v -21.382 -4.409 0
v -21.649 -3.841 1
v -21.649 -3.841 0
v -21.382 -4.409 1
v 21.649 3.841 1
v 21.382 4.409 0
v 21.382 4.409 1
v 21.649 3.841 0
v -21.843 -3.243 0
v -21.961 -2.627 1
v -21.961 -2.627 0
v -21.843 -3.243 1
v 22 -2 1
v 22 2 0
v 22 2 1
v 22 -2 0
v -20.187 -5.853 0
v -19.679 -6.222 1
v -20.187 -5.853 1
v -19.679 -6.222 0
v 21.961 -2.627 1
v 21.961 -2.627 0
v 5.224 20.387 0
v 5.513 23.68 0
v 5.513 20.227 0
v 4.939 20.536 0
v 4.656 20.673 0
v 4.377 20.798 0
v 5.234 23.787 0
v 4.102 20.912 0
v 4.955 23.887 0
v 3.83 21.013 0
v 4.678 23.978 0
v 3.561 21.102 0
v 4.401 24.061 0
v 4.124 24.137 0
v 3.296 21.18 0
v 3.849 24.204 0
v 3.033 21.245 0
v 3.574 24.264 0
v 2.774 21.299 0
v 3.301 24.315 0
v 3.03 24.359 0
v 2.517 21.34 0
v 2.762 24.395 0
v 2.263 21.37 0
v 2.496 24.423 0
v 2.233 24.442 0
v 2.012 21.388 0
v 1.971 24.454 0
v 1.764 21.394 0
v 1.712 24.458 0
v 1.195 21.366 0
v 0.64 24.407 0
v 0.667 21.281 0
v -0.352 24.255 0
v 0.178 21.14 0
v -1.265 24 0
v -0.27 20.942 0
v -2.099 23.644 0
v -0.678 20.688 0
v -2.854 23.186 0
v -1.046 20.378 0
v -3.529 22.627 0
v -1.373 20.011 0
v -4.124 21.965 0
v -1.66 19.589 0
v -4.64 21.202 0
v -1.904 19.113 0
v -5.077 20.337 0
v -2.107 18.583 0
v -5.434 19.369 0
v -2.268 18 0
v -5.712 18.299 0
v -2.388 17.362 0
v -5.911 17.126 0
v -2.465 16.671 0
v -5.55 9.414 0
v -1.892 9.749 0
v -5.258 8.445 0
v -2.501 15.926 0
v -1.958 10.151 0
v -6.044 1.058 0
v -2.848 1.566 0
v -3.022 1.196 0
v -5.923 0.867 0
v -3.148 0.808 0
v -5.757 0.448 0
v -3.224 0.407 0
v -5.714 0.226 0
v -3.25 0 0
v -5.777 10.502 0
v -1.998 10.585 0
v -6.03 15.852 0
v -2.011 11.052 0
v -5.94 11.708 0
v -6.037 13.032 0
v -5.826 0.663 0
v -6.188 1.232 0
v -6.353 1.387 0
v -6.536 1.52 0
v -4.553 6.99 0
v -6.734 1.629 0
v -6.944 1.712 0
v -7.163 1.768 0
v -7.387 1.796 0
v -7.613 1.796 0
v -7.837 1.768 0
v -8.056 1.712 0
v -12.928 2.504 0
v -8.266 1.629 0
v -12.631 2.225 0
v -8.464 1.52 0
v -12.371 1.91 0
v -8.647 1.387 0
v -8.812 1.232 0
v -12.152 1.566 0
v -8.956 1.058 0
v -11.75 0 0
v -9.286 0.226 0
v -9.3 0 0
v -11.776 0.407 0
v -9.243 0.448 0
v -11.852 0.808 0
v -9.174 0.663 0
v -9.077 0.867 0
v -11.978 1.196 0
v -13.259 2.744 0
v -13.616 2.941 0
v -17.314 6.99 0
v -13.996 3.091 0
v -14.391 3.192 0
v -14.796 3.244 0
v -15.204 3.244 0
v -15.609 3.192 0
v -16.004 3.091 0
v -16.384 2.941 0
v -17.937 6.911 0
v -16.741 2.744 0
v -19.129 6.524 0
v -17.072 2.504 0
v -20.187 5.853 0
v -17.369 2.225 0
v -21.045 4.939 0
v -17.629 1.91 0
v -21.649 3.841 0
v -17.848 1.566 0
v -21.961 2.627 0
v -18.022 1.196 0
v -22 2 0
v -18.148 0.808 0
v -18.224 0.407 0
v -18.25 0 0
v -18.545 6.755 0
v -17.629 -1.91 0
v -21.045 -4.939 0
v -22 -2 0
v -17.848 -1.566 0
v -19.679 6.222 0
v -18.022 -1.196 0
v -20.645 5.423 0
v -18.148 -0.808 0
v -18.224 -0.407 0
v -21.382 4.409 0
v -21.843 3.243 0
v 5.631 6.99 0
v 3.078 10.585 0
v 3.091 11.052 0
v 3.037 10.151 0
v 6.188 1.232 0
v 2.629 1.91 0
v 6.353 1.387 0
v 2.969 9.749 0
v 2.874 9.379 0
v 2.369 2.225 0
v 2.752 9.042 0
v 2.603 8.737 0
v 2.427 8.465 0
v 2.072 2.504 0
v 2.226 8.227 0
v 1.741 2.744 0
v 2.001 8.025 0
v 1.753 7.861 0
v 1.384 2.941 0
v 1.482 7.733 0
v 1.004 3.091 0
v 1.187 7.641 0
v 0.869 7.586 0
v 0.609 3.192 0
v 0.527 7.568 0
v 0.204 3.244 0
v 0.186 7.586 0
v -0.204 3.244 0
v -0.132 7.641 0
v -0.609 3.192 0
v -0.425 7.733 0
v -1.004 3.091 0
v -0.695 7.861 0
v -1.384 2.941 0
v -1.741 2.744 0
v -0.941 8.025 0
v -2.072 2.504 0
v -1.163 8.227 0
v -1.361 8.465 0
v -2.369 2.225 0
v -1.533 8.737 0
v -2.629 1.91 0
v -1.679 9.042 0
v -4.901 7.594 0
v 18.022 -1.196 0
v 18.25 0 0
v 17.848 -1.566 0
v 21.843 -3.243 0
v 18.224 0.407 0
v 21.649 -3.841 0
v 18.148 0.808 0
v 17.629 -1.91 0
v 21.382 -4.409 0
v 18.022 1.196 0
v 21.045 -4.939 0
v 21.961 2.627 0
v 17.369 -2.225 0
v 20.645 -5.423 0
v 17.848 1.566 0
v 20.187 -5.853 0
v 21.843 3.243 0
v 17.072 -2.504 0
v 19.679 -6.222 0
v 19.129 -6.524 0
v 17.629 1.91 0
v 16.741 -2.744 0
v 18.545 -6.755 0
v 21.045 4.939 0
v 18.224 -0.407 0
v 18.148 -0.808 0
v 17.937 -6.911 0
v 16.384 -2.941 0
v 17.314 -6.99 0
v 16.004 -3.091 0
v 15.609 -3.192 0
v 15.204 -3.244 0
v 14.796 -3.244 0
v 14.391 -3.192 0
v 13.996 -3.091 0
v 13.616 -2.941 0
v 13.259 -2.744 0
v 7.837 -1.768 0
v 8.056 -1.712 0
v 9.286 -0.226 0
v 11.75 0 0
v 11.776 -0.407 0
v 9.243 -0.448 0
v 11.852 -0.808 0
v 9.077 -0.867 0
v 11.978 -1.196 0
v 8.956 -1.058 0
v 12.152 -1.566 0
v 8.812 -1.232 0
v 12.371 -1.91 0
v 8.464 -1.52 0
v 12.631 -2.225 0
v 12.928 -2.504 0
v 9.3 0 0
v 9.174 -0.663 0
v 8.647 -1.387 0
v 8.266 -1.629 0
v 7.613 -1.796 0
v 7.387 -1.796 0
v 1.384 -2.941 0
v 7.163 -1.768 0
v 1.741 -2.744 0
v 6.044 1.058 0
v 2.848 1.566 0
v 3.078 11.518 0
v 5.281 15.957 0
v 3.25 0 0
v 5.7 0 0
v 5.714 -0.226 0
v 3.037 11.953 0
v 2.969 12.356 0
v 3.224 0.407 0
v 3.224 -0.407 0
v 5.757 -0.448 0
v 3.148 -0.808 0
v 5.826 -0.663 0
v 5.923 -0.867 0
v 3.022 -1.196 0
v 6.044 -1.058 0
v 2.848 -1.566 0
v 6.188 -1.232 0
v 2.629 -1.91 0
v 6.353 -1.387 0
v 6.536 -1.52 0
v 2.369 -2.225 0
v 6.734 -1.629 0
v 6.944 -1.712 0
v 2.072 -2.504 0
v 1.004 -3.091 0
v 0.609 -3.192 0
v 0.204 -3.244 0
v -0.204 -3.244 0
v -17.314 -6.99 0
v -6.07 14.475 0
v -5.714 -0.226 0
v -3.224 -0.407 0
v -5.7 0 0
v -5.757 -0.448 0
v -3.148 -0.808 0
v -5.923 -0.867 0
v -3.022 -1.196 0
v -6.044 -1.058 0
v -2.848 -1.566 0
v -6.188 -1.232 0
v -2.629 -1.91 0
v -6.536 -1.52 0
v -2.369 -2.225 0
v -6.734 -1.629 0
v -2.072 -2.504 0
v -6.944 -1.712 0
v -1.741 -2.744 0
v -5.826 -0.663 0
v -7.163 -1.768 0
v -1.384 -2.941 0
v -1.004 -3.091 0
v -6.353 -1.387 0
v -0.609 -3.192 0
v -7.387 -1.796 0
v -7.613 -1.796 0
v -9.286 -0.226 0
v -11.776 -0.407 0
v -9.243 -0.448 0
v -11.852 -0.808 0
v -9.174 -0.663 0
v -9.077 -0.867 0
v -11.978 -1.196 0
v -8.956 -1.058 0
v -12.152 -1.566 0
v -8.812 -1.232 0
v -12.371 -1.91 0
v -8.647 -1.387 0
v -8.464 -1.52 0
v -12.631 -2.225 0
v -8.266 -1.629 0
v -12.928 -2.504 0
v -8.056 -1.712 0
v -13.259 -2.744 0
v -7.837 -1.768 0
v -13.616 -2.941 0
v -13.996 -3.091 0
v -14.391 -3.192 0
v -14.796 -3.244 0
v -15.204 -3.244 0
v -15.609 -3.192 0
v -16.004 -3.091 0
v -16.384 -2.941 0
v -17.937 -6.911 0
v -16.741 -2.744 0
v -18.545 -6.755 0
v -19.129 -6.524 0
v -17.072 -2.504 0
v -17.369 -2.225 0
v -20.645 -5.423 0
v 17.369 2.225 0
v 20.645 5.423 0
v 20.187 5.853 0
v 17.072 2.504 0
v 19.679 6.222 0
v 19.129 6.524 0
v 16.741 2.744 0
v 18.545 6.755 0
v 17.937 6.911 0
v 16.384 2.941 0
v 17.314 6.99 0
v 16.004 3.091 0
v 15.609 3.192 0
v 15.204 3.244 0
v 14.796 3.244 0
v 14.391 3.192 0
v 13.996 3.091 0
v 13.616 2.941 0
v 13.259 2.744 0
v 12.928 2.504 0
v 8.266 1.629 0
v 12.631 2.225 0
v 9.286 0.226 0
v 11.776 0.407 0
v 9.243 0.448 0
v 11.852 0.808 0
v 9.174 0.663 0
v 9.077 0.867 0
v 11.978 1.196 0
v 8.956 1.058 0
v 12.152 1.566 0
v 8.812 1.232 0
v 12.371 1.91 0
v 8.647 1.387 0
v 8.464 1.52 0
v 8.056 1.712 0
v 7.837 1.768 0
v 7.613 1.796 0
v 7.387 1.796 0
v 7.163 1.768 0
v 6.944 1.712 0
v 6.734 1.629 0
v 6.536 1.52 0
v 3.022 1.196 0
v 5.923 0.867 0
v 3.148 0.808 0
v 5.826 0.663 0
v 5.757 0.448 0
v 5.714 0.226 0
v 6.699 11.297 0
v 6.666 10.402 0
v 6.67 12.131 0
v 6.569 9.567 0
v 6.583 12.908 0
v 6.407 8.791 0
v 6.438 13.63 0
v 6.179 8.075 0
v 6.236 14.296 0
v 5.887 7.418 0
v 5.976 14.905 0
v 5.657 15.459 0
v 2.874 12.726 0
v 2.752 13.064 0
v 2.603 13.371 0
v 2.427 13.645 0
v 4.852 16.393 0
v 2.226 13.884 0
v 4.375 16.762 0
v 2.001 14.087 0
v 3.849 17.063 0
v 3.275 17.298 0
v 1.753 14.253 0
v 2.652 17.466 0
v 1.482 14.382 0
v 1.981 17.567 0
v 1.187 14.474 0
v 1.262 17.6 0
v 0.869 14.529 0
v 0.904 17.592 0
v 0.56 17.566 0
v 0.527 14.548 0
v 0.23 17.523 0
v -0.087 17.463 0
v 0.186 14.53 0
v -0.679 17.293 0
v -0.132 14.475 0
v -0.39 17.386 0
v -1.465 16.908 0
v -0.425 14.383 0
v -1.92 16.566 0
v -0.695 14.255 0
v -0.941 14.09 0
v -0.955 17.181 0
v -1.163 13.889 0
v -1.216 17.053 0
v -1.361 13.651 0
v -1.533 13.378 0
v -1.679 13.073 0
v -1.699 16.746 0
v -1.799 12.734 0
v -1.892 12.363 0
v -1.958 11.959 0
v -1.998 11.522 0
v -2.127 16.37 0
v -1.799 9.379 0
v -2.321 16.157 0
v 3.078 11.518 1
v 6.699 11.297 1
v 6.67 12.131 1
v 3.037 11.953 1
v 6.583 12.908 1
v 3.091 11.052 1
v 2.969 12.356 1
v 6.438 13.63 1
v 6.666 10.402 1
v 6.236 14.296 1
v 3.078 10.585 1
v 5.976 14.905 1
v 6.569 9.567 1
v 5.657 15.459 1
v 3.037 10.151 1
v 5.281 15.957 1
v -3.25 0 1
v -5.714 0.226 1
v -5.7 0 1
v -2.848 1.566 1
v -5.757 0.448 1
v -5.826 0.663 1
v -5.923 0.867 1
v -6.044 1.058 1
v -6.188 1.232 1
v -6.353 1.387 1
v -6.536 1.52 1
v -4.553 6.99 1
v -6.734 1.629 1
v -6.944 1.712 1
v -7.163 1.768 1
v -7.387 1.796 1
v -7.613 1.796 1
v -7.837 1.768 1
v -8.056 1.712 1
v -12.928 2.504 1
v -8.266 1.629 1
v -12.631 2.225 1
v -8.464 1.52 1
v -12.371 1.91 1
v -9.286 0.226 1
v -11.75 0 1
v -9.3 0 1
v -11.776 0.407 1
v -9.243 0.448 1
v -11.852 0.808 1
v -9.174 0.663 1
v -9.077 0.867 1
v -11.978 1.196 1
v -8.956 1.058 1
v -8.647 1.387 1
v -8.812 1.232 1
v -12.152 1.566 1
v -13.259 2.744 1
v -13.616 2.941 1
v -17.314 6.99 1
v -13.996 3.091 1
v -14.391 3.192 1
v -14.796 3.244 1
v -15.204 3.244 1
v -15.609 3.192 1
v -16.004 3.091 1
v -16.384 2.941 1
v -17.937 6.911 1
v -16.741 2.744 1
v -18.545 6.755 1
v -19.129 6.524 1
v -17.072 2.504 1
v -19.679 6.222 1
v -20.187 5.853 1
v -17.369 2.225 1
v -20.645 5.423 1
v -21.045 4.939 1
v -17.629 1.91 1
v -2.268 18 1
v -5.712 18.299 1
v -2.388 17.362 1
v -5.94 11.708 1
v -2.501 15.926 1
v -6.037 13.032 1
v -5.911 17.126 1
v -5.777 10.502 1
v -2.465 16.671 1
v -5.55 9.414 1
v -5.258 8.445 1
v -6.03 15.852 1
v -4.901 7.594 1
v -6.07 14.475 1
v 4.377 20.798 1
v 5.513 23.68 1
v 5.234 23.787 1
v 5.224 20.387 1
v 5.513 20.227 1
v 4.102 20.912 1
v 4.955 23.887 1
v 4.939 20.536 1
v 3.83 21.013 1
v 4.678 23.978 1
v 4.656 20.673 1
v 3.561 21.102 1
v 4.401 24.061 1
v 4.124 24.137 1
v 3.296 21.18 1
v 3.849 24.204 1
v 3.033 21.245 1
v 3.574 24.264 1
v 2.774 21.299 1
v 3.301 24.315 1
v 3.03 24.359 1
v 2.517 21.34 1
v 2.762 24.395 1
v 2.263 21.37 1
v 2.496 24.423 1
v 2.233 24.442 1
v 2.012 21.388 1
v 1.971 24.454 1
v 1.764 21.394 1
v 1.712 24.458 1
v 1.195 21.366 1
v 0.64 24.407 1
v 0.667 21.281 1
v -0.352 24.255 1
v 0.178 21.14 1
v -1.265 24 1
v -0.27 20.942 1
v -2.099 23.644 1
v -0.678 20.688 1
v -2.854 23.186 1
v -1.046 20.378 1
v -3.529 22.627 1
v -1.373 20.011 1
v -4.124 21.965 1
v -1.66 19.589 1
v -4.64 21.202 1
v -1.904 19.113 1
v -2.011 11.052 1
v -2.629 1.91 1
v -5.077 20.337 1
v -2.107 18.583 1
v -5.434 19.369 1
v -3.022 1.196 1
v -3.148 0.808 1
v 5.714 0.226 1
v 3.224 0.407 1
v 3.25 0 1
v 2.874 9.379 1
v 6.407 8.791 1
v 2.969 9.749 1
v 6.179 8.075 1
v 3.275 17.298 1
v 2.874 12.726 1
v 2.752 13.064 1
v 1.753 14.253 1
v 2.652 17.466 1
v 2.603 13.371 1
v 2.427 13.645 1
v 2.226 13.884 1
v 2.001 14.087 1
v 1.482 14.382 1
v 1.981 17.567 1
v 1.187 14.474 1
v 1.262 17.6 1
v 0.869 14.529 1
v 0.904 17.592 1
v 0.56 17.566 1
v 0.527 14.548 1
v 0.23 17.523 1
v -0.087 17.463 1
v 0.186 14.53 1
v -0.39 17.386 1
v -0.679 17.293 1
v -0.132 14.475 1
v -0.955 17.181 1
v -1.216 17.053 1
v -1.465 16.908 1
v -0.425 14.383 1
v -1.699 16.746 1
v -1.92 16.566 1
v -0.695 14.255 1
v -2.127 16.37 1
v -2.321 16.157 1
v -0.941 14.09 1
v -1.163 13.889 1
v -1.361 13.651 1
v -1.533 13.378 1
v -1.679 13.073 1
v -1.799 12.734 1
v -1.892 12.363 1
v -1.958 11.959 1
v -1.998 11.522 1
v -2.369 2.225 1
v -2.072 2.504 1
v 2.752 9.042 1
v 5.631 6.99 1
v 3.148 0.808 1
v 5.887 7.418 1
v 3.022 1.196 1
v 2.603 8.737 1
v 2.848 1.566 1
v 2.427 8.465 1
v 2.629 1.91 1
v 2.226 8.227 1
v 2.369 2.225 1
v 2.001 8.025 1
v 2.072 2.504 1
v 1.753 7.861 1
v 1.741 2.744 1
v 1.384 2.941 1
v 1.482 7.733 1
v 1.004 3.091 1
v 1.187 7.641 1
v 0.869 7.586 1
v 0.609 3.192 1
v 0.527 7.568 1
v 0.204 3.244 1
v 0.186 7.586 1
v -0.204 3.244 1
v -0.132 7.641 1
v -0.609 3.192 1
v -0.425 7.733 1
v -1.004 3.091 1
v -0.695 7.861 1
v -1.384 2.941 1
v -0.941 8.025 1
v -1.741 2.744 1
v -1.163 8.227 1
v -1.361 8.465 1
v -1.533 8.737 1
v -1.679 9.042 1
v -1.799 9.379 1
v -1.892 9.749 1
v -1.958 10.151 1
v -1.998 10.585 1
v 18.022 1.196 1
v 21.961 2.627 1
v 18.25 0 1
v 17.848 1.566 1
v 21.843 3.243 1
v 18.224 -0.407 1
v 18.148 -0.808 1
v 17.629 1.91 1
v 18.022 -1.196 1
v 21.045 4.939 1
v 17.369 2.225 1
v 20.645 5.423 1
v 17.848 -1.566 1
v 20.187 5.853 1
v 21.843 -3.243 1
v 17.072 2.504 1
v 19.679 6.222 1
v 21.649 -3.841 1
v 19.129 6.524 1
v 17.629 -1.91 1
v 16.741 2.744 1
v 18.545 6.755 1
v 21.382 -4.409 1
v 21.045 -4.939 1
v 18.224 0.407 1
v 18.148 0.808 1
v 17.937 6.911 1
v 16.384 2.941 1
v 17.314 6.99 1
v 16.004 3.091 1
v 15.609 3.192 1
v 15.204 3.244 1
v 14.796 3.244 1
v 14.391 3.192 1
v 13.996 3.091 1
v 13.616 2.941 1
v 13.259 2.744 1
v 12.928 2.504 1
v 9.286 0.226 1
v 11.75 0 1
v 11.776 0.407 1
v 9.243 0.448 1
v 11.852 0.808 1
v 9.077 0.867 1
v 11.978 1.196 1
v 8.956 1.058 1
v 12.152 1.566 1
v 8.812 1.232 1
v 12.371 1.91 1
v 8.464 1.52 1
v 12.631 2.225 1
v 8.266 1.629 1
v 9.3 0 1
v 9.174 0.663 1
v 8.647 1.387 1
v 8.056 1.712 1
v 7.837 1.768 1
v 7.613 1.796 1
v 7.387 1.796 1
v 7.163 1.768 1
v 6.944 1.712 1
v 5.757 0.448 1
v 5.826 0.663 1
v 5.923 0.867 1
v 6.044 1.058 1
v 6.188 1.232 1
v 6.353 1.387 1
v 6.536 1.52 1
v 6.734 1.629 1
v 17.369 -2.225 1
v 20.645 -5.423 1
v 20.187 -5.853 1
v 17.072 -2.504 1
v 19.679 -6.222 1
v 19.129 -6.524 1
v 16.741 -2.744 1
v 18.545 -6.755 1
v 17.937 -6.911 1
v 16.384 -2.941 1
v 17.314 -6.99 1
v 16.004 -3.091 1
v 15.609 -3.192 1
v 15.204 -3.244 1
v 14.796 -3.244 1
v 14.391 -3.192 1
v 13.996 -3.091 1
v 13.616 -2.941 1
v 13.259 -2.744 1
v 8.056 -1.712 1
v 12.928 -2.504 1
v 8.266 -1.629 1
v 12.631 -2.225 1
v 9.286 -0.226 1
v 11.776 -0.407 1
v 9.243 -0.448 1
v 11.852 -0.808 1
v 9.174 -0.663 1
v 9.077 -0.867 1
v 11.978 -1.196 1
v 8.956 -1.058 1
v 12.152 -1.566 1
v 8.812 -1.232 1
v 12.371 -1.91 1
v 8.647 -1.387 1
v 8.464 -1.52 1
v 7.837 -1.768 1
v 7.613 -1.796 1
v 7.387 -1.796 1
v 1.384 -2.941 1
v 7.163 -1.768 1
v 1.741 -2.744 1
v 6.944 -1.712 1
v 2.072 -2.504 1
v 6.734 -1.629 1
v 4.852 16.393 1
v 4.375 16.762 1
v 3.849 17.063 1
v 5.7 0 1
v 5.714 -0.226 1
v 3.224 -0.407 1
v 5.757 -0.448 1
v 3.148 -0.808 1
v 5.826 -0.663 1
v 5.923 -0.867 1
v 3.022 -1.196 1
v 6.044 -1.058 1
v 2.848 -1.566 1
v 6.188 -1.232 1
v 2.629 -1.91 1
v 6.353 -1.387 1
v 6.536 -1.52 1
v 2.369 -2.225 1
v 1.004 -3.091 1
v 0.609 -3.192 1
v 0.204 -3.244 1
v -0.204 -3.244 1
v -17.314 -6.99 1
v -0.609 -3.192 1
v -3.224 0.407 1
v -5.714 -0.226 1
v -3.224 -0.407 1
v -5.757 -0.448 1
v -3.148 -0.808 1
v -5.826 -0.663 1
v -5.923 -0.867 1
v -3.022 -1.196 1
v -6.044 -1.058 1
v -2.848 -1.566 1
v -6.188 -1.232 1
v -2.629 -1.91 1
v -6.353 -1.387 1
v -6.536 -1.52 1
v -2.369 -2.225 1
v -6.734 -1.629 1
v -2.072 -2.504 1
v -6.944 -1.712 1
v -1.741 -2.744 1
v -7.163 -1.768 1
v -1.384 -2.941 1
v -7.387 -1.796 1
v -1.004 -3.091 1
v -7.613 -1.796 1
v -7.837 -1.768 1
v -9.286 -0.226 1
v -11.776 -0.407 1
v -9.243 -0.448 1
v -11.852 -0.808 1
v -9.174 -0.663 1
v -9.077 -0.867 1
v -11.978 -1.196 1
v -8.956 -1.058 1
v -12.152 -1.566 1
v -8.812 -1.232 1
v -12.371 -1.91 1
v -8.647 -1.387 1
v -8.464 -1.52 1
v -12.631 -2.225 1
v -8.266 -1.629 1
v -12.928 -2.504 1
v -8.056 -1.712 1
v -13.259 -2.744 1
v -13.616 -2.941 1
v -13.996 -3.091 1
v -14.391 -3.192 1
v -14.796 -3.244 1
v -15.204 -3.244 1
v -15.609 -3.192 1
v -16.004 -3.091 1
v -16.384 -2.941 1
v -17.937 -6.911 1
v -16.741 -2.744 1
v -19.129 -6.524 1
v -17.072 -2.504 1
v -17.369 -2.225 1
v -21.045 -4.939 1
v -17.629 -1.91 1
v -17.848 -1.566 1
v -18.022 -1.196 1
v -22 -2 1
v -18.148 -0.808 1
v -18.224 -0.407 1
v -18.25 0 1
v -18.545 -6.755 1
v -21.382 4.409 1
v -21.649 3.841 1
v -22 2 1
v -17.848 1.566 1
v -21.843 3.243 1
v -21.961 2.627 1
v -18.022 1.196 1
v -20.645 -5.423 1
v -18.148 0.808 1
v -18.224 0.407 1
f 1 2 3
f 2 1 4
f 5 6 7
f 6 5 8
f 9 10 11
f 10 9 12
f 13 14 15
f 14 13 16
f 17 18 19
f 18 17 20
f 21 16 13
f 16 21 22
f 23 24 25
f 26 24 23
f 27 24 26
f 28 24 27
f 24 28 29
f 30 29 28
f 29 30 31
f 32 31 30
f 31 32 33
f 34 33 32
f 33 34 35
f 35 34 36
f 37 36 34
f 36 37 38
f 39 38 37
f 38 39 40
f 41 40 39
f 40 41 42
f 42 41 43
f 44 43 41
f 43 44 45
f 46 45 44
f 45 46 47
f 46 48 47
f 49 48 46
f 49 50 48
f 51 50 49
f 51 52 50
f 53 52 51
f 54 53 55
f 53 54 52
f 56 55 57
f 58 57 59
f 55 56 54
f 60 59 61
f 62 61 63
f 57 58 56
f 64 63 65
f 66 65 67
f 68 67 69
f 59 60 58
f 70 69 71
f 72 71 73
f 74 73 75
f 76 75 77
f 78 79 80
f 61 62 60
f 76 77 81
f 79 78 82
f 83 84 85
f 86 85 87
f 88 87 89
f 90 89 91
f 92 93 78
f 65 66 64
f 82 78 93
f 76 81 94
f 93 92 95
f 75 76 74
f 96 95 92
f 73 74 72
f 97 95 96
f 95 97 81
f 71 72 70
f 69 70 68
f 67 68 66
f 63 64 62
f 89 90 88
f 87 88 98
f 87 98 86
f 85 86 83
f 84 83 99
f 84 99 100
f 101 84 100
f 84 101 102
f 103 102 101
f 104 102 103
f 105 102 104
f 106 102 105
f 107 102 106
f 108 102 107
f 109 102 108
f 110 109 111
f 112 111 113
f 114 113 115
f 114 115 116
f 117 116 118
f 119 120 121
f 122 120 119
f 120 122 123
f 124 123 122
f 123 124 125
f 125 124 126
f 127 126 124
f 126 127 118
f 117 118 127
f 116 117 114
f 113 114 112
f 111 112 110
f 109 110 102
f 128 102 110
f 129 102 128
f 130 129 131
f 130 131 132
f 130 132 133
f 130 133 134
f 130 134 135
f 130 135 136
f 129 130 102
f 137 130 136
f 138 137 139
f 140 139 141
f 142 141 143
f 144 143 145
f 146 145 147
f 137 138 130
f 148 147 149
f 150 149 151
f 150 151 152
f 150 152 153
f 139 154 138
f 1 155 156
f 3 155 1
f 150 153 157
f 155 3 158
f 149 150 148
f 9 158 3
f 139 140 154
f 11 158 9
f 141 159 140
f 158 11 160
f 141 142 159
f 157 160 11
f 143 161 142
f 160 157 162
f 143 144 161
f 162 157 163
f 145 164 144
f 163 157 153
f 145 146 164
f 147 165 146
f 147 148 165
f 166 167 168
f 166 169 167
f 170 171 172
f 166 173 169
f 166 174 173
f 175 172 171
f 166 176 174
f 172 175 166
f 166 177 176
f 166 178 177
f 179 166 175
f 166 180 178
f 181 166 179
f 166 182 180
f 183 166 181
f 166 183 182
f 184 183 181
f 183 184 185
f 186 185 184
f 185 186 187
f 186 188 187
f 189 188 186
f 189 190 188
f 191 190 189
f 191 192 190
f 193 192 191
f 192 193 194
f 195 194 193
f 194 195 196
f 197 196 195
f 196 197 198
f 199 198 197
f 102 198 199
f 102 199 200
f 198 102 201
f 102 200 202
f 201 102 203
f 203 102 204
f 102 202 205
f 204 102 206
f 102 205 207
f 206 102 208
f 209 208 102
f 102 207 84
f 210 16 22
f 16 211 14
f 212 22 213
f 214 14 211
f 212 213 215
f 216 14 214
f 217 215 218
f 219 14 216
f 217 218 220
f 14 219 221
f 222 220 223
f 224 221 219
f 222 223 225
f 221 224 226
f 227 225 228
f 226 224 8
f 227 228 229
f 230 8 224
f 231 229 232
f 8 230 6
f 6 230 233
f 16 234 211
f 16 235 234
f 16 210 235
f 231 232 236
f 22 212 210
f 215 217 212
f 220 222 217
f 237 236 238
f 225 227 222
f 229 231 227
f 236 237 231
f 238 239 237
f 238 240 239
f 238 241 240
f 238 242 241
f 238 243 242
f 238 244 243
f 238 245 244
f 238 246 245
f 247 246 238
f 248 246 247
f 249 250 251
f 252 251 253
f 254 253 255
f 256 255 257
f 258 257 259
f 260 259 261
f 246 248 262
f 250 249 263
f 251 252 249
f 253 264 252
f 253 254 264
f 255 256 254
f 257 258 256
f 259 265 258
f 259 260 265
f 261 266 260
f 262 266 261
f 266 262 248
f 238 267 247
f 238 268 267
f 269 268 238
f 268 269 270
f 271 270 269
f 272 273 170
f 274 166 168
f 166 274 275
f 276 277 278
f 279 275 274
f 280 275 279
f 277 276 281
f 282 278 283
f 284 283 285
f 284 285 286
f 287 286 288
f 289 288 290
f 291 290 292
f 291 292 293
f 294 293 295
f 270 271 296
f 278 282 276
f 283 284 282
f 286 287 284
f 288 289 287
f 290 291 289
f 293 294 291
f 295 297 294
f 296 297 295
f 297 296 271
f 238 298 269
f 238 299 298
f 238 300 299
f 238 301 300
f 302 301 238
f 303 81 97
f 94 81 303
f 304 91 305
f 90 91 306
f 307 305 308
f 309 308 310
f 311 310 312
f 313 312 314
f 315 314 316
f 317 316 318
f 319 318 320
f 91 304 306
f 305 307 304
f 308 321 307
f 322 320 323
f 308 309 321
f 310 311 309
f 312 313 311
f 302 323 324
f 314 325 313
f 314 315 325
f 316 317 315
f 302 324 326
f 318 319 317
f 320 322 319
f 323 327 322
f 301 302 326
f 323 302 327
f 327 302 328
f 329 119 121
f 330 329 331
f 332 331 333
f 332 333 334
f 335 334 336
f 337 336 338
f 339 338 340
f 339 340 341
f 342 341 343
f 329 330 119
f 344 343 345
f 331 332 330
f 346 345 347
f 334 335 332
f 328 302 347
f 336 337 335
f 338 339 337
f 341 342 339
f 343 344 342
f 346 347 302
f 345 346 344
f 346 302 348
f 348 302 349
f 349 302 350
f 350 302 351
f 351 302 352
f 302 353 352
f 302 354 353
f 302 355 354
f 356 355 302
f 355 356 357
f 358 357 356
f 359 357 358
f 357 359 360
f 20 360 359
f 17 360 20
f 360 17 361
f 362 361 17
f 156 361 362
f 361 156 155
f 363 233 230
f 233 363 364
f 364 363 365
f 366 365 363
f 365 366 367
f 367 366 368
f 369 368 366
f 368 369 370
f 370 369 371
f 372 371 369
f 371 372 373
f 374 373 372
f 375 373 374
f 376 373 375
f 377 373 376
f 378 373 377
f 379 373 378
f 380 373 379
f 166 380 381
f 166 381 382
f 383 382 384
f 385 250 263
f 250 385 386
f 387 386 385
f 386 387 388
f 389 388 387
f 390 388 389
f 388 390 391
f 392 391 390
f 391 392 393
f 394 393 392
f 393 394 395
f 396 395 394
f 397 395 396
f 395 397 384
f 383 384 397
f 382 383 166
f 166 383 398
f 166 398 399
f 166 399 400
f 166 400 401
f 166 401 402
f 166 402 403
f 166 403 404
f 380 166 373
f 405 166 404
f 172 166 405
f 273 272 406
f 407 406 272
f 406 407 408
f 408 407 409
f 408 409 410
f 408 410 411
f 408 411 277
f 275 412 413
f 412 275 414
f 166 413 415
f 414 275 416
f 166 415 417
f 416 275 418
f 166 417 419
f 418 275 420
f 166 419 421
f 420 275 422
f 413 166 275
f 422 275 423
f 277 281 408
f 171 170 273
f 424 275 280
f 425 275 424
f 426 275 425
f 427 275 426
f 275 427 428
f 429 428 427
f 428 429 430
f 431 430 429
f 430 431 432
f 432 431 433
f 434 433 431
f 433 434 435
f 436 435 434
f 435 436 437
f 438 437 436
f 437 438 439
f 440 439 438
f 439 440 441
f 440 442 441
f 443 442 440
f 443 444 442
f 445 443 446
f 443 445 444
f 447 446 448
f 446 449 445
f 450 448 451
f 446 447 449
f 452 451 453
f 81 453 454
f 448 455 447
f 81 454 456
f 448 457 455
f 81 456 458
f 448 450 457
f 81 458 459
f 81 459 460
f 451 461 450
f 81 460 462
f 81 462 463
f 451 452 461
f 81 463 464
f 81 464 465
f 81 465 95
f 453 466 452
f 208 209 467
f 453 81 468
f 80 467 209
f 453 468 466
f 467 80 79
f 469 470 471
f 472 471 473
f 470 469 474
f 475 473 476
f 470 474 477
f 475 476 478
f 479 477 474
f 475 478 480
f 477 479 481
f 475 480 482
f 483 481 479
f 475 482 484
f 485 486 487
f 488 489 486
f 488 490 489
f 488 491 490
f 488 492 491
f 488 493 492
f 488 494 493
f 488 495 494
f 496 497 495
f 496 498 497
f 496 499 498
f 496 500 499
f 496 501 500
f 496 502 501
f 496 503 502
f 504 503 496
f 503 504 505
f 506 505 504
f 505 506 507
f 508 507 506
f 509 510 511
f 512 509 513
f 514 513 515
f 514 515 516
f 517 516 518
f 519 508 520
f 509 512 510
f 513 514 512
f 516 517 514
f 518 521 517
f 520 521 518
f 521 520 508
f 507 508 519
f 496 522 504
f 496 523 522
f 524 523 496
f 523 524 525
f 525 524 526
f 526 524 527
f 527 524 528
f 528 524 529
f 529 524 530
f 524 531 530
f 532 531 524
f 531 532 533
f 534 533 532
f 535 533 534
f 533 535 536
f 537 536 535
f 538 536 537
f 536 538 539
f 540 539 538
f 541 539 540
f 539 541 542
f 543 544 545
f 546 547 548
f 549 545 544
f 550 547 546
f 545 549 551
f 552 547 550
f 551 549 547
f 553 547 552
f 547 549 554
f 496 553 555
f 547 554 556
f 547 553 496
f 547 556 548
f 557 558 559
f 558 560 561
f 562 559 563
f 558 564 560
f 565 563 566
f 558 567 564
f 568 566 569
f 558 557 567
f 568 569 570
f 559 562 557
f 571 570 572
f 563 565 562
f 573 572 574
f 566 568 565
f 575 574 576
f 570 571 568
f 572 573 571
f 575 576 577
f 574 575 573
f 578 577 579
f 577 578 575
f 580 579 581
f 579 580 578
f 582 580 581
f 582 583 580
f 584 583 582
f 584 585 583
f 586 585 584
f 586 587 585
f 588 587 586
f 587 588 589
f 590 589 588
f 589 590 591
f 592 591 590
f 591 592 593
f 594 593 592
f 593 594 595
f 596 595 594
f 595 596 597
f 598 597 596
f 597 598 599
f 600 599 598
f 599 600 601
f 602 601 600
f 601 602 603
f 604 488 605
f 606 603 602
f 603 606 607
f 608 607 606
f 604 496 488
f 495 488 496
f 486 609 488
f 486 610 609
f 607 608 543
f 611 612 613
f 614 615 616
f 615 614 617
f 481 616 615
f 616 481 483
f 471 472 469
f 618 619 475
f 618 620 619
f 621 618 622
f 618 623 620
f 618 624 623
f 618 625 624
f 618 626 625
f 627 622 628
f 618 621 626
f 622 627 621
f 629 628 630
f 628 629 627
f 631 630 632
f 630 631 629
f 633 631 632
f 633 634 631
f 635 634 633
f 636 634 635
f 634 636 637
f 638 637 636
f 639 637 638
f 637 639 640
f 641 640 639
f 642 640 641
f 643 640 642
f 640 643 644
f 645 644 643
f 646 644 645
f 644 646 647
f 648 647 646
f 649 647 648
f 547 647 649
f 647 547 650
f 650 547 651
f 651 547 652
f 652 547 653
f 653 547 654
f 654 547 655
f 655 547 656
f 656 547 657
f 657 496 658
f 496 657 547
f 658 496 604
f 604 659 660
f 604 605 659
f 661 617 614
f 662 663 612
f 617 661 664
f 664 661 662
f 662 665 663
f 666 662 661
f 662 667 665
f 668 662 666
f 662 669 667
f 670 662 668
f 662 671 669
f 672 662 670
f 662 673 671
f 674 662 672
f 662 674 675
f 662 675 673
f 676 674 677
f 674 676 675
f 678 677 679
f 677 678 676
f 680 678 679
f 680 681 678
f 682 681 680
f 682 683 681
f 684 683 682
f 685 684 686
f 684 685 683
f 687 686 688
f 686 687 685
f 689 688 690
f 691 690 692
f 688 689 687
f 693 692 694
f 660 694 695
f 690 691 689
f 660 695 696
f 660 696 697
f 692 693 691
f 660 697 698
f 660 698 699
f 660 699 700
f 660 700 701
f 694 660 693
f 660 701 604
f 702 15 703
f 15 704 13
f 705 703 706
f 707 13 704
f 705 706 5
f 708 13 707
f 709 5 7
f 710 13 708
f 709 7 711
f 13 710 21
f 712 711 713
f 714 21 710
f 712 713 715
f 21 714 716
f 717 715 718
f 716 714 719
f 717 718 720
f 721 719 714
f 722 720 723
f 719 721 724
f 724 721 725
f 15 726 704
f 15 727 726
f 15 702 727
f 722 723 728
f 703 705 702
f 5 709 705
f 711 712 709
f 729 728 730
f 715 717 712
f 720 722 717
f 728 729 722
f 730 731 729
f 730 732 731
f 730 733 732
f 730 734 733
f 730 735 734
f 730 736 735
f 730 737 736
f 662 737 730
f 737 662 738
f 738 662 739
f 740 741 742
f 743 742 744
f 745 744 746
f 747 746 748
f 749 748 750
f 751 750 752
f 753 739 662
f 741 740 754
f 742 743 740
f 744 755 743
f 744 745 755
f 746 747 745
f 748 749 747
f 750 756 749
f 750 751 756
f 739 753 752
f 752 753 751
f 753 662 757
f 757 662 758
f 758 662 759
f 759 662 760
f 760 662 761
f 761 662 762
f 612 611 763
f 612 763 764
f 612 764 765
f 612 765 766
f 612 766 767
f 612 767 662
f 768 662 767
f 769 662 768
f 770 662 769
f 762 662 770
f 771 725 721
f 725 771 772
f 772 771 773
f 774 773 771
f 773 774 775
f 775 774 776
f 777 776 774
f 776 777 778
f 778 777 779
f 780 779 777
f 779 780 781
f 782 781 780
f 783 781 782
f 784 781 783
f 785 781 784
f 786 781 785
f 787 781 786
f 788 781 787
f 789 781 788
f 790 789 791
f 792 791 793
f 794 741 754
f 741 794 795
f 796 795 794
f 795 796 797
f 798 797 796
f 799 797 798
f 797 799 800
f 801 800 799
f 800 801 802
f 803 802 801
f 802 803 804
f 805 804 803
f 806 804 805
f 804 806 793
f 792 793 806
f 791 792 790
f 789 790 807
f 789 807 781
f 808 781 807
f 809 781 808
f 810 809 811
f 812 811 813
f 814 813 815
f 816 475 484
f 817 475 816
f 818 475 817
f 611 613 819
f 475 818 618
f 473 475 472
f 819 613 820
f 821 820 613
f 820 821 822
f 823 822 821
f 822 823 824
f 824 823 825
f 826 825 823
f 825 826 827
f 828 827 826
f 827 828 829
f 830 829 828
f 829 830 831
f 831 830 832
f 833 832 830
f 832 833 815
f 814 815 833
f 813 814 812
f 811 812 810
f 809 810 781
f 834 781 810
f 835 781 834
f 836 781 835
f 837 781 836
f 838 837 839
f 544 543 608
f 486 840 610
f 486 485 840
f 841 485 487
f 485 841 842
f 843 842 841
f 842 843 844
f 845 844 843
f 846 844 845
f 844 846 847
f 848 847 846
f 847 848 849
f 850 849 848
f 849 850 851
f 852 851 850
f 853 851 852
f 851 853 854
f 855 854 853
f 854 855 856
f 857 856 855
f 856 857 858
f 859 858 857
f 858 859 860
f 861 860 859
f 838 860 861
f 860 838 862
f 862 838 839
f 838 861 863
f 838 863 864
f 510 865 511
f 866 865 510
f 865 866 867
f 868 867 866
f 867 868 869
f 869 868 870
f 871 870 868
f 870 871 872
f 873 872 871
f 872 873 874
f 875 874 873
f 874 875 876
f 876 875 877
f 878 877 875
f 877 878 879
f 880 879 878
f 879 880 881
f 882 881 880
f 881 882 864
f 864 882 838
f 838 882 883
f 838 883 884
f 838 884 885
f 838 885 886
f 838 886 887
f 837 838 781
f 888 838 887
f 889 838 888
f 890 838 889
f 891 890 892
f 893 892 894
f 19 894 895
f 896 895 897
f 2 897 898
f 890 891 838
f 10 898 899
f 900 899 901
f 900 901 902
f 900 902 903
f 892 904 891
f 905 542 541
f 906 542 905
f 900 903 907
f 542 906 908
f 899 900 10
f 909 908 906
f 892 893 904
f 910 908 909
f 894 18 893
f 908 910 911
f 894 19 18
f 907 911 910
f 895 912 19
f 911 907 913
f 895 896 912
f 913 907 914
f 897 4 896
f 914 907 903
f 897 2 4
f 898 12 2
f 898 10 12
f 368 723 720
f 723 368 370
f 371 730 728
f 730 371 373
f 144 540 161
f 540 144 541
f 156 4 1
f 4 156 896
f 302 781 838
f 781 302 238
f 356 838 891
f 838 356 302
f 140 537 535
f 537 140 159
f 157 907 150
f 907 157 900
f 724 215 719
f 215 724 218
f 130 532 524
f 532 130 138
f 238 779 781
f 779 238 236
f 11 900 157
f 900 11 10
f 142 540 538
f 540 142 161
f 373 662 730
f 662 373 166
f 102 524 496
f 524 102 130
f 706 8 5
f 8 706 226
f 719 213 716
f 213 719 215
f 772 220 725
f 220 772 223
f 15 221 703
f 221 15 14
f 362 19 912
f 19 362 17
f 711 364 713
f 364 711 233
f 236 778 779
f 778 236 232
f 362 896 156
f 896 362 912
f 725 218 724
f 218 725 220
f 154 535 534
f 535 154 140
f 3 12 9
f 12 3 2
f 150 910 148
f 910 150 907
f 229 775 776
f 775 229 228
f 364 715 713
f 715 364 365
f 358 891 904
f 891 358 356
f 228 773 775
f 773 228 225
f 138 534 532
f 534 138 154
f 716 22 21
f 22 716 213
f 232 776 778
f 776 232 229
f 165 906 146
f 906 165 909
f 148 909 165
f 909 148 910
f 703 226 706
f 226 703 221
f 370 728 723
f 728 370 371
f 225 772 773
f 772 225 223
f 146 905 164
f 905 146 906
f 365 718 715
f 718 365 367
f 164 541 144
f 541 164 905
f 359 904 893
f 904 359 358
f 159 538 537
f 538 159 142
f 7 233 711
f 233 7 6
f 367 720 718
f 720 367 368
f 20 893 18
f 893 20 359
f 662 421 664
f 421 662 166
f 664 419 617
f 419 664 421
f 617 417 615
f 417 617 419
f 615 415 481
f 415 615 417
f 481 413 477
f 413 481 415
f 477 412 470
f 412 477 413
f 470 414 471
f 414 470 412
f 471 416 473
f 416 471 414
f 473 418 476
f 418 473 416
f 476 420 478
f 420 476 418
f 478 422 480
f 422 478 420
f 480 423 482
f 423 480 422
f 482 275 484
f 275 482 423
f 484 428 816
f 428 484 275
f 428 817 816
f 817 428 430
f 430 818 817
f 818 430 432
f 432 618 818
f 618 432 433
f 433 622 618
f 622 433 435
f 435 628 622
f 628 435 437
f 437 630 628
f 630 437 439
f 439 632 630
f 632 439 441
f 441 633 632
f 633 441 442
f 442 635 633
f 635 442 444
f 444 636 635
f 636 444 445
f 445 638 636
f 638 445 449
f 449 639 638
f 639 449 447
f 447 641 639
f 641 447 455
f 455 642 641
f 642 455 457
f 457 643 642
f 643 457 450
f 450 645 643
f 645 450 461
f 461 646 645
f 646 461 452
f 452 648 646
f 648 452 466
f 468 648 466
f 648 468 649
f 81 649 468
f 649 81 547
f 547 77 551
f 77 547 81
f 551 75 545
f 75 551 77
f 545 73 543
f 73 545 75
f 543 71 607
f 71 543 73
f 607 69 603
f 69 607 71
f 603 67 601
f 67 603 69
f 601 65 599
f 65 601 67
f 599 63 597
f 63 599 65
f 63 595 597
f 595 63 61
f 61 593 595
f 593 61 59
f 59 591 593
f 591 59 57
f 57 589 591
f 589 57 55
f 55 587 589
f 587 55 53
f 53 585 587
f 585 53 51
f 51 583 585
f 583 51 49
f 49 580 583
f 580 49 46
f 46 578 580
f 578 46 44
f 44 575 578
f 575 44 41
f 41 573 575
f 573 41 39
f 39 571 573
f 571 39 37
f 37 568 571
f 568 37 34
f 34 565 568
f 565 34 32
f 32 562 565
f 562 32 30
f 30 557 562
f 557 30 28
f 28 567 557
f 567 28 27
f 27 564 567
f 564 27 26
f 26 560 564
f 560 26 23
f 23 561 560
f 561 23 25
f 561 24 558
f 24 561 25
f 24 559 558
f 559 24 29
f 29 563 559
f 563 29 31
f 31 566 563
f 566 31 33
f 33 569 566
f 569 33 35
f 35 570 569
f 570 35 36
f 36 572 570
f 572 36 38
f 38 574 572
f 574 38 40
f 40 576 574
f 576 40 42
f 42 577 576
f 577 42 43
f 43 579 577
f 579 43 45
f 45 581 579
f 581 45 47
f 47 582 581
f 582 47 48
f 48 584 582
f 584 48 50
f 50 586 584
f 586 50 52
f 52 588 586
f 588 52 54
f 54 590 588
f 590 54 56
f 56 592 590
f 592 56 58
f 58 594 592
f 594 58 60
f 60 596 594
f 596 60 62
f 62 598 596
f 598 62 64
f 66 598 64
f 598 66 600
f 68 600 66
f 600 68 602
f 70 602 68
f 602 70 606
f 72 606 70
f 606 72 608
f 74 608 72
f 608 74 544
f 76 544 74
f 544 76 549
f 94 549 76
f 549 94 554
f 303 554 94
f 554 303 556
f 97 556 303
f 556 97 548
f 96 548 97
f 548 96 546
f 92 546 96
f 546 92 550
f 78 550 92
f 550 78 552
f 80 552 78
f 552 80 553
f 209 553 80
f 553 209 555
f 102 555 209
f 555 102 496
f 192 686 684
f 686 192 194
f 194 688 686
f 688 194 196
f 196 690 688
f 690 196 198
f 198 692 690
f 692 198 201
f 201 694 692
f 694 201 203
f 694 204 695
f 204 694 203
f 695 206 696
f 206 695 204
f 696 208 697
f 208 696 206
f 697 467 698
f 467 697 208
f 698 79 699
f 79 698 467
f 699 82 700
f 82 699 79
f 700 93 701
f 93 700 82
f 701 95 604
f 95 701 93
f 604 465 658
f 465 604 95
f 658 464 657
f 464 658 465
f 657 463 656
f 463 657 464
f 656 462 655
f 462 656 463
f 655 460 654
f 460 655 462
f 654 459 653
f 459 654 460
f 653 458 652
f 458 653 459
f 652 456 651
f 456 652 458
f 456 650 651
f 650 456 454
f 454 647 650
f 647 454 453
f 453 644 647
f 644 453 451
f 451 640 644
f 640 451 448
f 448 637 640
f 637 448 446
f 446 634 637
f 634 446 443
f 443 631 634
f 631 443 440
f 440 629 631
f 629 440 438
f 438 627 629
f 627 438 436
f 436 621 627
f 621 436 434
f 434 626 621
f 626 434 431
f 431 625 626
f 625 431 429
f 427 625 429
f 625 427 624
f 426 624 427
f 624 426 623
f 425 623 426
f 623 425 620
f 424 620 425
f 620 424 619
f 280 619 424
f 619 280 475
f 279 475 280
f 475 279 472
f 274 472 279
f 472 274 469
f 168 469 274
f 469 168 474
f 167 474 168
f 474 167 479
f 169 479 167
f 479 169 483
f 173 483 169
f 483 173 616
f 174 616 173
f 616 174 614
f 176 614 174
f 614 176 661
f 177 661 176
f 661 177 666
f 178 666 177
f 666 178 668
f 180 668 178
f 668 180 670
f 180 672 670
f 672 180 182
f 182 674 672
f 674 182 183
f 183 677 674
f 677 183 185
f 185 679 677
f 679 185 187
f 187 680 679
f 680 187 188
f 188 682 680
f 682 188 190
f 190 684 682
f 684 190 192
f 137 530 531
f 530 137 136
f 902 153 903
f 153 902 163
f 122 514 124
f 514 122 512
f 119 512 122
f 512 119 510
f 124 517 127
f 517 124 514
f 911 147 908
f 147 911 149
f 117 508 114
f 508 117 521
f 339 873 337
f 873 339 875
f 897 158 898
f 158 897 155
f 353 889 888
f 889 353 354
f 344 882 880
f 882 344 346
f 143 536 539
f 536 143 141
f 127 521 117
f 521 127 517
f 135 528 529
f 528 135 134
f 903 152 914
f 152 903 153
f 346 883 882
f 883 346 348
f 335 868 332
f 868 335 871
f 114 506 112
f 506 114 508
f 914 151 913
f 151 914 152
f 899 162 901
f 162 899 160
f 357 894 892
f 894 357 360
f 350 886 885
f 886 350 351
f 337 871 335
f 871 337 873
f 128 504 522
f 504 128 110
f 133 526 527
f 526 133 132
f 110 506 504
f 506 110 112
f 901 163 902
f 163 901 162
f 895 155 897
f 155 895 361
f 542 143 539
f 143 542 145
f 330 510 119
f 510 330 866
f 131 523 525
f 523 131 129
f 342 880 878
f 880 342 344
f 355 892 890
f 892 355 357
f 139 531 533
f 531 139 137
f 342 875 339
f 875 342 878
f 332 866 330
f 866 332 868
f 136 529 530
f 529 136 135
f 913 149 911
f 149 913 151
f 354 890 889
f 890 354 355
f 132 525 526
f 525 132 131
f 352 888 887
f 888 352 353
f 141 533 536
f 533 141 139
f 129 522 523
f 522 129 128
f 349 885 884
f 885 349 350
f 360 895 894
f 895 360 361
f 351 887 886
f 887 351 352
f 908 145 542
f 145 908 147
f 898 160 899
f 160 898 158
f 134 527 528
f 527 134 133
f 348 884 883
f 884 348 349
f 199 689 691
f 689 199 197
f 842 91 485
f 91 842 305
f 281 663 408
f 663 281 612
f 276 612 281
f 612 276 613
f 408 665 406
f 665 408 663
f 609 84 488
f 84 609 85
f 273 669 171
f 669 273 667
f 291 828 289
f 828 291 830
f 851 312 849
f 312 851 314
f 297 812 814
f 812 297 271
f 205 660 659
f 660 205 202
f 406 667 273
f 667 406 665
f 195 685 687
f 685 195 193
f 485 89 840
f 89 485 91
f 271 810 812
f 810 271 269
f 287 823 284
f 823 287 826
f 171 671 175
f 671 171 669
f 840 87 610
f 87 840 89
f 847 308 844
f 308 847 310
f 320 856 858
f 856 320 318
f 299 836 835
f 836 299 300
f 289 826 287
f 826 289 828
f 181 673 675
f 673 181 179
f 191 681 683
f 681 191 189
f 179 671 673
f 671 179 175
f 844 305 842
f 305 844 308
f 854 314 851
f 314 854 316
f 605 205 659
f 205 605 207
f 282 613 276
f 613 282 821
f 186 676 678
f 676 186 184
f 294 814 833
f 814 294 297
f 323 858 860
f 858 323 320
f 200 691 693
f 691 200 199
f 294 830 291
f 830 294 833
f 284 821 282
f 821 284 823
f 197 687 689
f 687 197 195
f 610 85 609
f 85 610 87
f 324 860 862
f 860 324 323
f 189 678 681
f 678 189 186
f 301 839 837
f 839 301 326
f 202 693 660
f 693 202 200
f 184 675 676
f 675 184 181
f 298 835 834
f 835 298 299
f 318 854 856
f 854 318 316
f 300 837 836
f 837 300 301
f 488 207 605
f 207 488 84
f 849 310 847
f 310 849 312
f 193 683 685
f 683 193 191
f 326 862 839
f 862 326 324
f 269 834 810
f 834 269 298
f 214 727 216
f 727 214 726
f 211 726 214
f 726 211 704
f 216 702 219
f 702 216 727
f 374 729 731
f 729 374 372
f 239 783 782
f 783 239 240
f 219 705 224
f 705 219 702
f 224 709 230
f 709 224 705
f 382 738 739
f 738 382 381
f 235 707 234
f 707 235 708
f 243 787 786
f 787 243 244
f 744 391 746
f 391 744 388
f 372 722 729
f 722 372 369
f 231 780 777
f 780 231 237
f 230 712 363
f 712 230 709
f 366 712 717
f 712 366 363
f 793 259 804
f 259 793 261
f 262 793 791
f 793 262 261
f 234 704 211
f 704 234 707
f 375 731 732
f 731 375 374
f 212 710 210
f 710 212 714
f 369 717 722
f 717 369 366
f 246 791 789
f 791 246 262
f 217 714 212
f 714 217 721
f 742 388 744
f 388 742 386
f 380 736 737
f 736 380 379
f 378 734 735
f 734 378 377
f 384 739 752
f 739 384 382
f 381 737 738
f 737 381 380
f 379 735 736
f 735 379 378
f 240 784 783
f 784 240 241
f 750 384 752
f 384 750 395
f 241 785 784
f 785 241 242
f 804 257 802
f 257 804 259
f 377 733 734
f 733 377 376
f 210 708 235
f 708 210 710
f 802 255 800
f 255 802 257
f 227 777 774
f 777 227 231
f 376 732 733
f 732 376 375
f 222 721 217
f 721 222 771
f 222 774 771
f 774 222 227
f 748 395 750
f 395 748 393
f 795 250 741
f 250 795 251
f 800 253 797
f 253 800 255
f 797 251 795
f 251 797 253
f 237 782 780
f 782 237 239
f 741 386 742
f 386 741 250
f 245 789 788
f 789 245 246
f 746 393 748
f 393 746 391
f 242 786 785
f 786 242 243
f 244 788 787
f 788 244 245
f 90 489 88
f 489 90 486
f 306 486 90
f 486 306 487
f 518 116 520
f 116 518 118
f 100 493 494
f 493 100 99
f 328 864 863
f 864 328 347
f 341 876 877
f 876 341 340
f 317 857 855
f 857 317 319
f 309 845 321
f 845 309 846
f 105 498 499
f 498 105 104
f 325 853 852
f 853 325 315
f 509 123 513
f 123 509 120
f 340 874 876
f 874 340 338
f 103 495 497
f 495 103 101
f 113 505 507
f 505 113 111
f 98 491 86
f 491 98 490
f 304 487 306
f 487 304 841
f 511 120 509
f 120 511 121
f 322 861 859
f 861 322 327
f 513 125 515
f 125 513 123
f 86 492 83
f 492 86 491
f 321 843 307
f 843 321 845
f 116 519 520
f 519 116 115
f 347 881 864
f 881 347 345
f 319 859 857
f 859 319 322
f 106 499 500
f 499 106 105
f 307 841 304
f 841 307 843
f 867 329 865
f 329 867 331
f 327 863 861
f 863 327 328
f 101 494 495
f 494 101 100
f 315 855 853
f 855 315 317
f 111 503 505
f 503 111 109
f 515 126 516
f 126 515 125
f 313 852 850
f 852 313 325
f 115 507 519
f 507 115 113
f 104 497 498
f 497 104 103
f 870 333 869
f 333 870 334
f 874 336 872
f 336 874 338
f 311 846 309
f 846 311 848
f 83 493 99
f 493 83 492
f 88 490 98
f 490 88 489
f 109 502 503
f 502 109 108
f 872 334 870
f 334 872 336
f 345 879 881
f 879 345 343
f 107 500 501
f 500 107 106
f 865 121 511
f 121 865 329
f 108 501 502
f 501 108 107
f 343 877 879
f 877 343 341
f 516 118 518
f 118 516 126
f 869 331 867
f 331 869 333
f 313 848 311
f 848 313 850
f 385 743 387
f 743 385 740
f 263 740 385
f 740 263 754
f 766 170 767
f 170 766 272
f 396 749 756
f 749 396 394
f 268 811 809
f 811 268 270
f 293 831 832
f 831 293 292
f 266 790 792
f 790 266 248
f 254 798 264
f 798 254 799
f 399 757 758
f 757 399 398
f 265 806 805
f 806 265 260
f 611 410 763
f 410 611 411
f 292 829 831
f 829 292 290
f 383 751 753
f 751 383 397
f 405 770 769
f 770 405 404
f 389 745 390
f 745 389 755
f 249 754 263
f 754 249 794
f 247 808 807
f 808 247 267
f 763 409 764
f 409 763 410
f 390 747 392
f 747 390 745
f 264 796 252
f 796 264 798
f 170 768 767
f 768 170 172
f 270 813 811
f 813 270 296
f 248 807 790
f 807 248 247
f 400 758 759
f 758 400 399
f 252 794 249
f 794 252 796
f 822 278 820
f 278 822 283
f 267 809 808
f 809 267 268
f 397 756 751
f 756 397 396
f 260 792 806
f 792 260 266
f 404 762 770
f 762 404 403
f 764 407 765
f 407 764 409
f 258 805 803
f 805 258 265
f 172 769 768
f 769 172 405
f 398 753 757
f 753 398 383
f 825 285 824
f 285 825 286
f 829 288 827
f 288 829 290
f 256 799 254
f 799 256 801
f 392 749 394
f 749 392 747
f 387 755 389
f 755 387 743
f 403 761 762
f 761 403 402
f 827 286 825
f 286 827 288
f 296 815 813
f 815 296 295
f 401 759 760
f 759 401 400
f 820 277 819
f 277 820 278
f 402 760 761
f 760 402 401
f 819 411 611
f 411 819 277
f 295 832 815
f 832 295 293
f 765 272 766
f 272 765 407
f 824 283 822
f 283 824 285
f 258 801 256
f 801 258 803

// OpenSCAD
$fn = 50;


difference() {
	union() {
		hull() {
			translate(v = [-17.0000000000, 2.0000000000, 0]) {
				cylinder(h = 1, r = 5);
			}
			translate(v = [17.0000000000, 2.0000000000, 0]) {
				cylinder(h = 1, r = 5);
			}
			translate(v = [-17.0000000000, -2.0000000000, 0]) {
				cylinder(h = 1, r = 5);
			}
			translate(v = [17.0000000000, -2.0000000000, 0]) {
				cylinder(h = 1, r = 5);
			}
		}
		translate(v = [0, 24, 0]) {
			linear_extrude(height = 1) {
				text(font = "DejaVu Sans Mono:style=Bold", halign = "center", size = 19.0000000000, text = "6", valign = "top");
			}
		}
	}
	union() {
		translate(v = [-15.0000000000, 0.0000000000, 0]) {
			translate(v = [0, 0, -100]) {
				cylinder(h = 200, r = 3.2500000000);
			}
		}
		translate(v = [0, 0, -100]) {
			cylinder(h = 200, r = 3.2500000000);
		}
		translate(v = [15.0000000000, 0.0000000000, 0]) {
			translate(v = [0, 0, -100]) {
				cylinder(h = 200, r = 3.2500000000);
			}
		}
		translate(v = [-15.0000000000, 0.0000000000, 0]) {
			translate(v = [0, 0, -100]) {
				cylinder(h = 200, r = 1.8000000000);
			}
		}
		translate(v = [-7.5000000000, 0.0000000000, 0]) {
			translate(v = [0, 0, -100]) {
				cylinder(h = 200, r = 1.8000000000);
			}
		}
		translate(v = [0, 0, -100]) {
			cylinder(h = 200, r = 1.8000000000);
		}
		translate(v = [7.5000000000, 0.0000000000, 0]) {
			translate(v = [0, 0, -100]) {
				cylinder(h = 200, r = 1.8000000000);
			}
		}
		translate(v = [15.0000000000, 0.0000000000, 0]) {
			translate(v = [0, 0, -100]) {
				cylinder(h = 200, r = 1.8000000000);
			}
		}
	}
}
